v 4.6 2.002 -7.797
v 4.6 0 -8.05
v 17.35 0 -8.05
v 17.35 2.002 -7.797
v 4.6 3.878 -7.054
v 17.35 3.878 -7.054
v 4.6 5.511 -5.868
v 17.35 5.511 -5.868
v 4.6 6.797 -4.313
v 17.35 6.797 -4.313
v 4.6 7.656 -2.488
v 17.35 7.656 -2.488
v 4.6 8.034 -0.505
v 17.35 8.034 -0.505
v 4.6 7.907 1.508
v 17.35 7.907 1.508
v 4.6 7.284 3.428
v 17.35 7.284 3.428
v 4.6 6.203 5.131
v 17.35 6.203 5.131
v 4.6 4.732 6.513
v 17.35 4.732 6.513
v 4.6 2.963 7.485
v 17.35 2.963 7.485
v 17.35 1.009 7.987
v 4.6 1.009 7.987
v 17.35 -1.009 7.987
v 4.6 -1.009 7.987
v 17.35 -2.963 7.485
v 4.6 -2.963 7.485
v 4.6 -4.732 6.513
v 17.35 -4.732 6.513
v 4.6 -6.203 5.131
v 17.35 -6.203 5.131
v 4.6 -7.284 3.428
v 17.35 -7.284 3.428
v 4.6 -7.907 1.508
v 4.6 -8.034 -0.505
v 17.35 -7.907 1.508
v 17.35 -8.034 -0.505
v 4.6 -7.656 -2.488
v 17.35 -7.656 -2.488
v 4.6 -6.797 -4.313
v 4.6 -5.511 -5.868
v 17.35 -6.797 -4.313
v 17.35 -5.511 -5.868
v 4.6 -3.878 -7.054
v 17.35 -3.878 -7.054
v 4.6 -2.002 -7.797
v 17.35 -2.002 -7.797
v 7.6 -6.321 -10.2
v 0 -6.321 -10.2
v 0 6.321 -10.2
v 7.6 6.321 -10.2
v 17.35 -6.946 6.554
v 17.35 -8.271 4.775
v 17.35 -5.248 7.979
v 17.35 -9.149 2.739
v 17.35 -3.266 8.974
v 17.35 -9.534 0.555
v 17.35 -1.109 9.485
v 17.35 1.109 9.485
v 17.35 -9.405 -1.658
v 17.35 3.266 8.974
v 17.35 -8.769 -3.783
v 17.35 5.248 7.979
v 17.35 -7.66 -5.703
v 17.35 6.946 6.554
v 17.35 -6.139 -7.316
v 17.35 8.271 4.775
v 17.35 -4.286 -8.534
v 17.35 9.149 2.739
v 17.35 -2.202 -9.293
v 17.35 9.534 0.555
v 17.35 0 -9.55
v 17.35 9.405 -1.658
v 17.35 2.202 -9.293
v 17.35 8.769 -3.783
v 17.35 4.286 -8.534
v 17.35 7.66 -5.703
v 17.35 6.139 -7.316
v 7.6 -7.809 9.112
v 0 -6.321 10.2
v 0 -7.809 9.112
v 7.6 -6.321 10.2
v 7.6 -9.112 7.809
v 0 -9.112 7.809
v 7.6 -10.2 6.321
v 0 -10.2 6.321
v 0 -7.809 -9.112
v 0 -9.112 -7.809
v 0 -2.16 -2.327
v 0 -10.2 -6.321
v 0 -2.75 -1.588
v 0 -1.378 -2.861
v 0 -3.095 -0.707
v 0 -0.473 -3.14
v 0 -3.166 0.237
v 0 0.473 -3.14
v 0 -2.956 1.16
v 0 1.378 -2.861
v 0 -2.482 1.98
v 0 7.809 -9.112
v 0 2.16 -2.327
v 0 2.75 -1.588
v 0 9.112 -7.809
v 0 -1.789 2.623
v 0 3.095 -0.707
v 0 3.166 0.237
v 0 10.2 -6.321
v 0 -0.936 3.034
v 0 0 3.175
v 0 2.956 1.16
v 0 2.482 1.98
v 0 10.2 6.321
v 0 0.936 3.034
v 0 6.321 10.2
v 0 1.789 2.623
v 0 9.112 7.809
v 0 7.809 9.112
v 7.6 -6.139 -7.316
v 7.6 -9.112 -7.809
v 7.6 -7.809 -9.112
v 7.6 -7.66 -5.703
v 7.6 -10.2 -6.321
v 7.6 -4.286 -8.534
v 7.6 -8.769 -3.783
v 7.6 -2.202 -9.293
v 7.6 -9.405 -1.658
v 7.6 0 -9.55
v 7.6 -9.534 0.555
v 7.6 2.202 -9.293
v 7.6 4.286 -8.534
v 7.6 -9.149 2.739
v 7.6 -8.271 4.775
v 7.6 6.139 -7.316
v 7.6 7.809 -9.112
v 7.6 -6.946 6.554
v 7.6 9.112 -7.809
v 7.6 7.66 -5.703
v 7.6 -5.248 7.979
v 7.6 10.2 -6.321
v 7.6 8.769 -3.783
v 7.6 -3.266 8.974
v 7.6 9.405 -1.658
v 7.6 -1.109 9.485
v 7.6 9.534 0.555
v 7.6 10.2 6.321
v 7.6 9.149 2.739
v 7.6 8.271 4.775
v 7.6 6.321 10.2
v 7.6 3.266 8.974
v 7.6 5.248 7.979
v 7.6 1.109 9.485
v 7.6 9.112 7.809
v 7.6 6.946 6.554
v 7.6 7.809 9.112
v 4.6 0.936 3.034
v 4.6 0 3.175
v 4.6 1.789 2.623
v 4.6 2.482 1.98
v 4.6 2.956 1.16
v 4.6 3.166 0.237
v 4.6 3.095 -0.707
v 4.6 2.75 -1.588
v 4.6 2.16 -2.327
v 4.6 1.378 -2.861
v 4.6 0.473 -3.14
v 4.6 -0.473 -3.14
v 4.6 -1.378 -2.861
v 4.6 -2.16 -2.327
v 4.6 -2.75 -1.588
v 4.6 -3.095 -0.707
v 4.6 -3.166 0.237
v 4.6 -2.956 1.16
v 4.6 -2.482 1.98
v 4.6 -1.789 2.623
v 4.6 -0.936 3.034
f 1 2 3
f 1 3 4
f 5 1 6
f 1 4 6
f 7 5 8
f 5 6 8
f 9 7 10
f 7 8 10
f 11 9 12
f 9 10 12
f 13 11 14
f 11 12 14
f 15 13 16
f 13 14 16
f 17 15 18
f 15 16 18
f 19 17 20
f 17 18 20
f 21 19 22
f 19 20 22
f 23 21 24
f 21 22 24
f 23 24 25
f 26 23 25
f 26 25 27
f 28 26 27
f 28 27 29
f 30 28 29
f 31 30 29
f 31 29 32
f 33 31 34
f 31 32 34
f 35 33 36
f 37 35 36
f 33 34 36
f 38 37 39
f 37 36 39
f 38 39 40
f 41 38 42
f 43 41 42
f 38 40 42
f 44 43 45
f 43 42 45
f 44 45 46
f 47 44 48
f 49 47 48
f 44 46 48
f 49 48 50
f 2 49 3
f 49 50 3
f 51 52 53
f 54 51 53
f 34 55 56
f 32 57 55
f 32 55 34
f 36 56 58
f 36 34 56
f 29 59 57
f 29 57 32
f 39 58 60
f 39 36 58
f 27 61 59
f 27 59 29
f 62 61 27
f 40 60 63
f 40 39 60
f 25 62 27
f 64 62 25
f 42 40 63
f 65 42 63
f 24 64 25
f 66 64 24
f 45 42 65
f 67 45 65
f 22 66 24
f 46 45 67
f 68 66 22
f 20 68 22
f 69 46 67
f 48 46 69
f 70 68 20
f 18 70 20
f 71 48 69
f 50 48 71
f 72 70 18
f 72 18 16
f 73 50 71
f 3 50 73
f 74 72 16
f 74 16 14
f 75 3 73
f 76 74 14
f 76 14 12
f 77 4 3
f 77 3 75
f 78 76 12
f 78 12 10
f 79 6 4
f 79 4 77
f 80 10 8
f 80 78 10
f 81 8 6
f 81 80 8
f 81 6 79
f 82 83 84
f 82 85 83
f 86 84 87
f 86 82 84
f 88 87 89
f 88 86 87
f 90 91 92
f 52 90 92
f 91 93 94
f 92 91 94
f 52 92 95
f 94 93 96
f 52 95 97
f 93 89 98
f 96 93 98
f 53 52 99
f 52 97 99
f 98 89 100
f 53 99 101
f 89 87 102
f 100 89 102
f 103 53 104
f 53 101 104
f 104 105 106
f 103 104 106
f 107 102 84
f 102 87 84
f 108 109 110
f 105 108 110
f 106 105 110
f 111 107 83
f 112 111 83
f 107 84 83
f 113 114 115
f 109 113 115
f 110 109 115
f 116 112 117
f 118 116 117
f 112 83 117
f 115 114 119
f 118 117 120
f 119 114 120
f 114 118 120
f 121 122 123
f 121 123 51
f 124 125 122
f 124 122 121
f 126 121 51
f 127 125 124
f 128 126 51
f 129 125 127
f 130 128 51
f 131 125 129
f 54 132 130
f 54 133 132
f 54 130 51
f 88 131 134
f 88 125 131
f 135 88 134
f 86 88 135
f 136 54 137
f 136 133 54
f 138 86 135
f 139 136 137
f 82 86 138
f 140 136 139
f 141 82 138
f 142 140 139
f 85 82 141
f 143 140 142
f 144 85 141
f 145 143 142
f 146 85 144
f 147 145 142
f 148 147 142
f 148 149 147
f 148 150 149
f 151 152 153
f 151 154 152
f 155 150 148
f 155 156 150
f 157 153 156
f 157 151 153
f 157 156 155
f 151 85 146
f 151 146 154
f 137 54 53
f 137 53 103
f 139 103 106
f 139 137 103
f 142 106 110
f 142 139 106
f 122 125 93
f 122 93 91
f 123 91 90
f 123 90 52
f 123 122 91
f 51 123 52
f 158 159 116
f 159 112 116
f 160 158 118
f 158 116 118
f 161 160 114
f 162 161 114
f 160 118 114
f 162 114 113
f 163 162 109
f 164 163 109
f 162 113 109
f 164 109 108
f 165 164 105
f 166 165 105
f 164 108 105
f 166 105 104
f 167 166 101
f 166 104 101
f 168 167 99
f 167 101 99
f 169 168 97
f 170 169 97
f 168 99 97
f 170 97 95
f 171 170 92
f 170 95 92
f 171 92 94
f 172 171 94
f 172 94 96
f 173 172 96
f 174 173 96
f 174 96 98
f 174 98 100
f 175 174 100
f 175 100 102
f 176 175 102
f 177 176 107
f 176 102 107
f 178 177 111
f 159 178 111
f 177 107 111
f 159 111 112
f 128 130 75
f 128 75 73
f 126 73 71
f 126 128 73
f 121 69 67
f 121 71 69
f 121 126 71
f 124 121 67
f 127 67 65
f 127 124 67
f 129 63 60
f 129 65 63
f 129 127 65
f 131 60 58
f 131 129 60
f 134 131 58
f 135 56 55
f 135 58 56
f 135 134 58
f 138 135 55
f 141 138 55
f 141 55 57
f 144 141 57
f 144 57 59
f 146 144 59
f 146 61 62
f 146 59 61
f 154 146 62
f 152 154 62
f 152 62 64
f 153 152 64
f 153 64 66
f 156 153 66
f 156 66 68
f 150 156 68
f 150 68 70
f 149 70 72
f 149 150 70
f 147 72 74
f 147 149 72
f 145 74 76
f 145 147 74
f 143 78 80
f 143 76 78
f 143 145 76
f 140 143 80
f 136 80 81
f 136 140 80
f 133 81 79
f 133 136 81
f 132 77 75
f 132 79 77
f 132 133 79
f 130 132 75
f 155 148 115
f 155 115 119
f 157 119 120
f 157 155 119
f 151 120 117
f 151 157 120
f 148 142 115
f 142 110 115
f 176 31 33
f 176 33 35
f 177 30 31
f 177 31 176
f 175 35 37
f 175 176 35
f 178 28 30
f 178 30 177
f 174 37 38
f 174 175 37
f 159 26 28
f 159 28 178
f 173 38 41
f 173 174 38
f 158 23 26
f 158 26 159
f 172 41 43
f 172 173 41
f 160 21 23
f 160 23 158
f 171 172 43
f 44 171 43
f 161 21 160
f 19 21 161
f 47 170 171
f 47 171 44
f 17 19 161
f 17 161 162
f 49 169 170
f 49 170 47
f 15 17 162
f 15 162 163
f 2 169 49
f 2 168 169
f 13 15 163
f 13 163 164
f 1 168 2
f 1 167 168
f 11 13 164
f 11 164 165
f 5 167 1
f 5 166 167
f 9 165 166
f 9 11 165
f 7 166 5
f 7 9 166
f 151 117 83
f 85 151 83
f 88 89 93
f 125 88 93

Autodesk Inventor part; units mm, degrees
ref_plane "YZ Plane" through (0, 0, 0) normal (1, 0, 0) x (0, 1, 0)
ref_plane "XZ Plane" through (0, 0, 0) normal (0, 1, 0) x (-1, 0, 0)
ref_plane "XY Plane" through (0, 0, 0) normal (0, 0, 1) x (1, 0, 0)
sketch "Sketch1" plane through (0, 0, 0) normal (1, 0, 0) x (0, 1, 0)
  line L0 (-10.2, -10.2) -> (10.2, -10.2)
  line L1 (10.2, -10.2) -> (10.2, 10.2)
  line L2 (10.2, 10.2) -> (-10.2, 10.2)
  line L3 (-10.2, 10.2) -> (-10.2, -10.2)
  line L4 (-10.2, -10.2) -> (10.2, 10.2) construction
  line L5 (10.2, -10.2) -> (-10.2, 10.2) construction
  point P0 (0, 0)
  dimension "d0" = 20.4
  dimension "d1" = 20.4
extrude "Extrusion1" add sketch "Sketch1" along normal blind 7.6
sketch "Sketch2" plane through (7.6, 0, 0) normal (1, 0, 0) x (0, 0, -1)
  circle A0 centre (0, 0) radius 12
  circle A1 centre (0, 0) radius 16.688
  dimension "d4" = 24
extrude "Extrusion2" cut sketch "Sketch2" against normal blind 7.6
sketch "Sketch3" plane through (7.6, 0, 0) normal (1, 0, 0) x (0, 0, -1)
  circle A0 centre (0, 0) radius 9.55
  dimension "d7" = 19.1
extrude "Extrusion3" add sketch "Sketch3" along normal blind 9.75
sketch "Sketch4" plane through (17.35, 0, 0) normal (1, 0, 0) x (0, 0, -1)
  circle A0 centre (0, 0) radius 8.05
  dimension "d10" = 16.1
extrude "Extrusion4" cut sketch "Sketch4" against normal blind 12.75
sketch "Sketch5" plane through (4.6, 0, 0) normal (1, 0, 0) x (0, 0, -1)
  point P0 (0, 0)
sketch "Sketch6" plane through (17.35, 0, 0) normal (1, 0, 0) x (0, 0, -1)
  point P0 (0, 0)
sketch "Sketch7" plane through (0, 0, 0) normal (-1, 0, 0) x (0, 0, 1)
  circle A0 centre (0, 0) radius 3.175
  dimension "d13" = 6.35
extrude "Extrusion5" cut sketch "Sketch7" against normal blind 12.75
sketch "Sketch8" plane through (0, 0, 0) normal (-1, 0, 0) x (0, 0, 1)
  point P0 (0, 0)
properties part number "thiccBB_hubs"
